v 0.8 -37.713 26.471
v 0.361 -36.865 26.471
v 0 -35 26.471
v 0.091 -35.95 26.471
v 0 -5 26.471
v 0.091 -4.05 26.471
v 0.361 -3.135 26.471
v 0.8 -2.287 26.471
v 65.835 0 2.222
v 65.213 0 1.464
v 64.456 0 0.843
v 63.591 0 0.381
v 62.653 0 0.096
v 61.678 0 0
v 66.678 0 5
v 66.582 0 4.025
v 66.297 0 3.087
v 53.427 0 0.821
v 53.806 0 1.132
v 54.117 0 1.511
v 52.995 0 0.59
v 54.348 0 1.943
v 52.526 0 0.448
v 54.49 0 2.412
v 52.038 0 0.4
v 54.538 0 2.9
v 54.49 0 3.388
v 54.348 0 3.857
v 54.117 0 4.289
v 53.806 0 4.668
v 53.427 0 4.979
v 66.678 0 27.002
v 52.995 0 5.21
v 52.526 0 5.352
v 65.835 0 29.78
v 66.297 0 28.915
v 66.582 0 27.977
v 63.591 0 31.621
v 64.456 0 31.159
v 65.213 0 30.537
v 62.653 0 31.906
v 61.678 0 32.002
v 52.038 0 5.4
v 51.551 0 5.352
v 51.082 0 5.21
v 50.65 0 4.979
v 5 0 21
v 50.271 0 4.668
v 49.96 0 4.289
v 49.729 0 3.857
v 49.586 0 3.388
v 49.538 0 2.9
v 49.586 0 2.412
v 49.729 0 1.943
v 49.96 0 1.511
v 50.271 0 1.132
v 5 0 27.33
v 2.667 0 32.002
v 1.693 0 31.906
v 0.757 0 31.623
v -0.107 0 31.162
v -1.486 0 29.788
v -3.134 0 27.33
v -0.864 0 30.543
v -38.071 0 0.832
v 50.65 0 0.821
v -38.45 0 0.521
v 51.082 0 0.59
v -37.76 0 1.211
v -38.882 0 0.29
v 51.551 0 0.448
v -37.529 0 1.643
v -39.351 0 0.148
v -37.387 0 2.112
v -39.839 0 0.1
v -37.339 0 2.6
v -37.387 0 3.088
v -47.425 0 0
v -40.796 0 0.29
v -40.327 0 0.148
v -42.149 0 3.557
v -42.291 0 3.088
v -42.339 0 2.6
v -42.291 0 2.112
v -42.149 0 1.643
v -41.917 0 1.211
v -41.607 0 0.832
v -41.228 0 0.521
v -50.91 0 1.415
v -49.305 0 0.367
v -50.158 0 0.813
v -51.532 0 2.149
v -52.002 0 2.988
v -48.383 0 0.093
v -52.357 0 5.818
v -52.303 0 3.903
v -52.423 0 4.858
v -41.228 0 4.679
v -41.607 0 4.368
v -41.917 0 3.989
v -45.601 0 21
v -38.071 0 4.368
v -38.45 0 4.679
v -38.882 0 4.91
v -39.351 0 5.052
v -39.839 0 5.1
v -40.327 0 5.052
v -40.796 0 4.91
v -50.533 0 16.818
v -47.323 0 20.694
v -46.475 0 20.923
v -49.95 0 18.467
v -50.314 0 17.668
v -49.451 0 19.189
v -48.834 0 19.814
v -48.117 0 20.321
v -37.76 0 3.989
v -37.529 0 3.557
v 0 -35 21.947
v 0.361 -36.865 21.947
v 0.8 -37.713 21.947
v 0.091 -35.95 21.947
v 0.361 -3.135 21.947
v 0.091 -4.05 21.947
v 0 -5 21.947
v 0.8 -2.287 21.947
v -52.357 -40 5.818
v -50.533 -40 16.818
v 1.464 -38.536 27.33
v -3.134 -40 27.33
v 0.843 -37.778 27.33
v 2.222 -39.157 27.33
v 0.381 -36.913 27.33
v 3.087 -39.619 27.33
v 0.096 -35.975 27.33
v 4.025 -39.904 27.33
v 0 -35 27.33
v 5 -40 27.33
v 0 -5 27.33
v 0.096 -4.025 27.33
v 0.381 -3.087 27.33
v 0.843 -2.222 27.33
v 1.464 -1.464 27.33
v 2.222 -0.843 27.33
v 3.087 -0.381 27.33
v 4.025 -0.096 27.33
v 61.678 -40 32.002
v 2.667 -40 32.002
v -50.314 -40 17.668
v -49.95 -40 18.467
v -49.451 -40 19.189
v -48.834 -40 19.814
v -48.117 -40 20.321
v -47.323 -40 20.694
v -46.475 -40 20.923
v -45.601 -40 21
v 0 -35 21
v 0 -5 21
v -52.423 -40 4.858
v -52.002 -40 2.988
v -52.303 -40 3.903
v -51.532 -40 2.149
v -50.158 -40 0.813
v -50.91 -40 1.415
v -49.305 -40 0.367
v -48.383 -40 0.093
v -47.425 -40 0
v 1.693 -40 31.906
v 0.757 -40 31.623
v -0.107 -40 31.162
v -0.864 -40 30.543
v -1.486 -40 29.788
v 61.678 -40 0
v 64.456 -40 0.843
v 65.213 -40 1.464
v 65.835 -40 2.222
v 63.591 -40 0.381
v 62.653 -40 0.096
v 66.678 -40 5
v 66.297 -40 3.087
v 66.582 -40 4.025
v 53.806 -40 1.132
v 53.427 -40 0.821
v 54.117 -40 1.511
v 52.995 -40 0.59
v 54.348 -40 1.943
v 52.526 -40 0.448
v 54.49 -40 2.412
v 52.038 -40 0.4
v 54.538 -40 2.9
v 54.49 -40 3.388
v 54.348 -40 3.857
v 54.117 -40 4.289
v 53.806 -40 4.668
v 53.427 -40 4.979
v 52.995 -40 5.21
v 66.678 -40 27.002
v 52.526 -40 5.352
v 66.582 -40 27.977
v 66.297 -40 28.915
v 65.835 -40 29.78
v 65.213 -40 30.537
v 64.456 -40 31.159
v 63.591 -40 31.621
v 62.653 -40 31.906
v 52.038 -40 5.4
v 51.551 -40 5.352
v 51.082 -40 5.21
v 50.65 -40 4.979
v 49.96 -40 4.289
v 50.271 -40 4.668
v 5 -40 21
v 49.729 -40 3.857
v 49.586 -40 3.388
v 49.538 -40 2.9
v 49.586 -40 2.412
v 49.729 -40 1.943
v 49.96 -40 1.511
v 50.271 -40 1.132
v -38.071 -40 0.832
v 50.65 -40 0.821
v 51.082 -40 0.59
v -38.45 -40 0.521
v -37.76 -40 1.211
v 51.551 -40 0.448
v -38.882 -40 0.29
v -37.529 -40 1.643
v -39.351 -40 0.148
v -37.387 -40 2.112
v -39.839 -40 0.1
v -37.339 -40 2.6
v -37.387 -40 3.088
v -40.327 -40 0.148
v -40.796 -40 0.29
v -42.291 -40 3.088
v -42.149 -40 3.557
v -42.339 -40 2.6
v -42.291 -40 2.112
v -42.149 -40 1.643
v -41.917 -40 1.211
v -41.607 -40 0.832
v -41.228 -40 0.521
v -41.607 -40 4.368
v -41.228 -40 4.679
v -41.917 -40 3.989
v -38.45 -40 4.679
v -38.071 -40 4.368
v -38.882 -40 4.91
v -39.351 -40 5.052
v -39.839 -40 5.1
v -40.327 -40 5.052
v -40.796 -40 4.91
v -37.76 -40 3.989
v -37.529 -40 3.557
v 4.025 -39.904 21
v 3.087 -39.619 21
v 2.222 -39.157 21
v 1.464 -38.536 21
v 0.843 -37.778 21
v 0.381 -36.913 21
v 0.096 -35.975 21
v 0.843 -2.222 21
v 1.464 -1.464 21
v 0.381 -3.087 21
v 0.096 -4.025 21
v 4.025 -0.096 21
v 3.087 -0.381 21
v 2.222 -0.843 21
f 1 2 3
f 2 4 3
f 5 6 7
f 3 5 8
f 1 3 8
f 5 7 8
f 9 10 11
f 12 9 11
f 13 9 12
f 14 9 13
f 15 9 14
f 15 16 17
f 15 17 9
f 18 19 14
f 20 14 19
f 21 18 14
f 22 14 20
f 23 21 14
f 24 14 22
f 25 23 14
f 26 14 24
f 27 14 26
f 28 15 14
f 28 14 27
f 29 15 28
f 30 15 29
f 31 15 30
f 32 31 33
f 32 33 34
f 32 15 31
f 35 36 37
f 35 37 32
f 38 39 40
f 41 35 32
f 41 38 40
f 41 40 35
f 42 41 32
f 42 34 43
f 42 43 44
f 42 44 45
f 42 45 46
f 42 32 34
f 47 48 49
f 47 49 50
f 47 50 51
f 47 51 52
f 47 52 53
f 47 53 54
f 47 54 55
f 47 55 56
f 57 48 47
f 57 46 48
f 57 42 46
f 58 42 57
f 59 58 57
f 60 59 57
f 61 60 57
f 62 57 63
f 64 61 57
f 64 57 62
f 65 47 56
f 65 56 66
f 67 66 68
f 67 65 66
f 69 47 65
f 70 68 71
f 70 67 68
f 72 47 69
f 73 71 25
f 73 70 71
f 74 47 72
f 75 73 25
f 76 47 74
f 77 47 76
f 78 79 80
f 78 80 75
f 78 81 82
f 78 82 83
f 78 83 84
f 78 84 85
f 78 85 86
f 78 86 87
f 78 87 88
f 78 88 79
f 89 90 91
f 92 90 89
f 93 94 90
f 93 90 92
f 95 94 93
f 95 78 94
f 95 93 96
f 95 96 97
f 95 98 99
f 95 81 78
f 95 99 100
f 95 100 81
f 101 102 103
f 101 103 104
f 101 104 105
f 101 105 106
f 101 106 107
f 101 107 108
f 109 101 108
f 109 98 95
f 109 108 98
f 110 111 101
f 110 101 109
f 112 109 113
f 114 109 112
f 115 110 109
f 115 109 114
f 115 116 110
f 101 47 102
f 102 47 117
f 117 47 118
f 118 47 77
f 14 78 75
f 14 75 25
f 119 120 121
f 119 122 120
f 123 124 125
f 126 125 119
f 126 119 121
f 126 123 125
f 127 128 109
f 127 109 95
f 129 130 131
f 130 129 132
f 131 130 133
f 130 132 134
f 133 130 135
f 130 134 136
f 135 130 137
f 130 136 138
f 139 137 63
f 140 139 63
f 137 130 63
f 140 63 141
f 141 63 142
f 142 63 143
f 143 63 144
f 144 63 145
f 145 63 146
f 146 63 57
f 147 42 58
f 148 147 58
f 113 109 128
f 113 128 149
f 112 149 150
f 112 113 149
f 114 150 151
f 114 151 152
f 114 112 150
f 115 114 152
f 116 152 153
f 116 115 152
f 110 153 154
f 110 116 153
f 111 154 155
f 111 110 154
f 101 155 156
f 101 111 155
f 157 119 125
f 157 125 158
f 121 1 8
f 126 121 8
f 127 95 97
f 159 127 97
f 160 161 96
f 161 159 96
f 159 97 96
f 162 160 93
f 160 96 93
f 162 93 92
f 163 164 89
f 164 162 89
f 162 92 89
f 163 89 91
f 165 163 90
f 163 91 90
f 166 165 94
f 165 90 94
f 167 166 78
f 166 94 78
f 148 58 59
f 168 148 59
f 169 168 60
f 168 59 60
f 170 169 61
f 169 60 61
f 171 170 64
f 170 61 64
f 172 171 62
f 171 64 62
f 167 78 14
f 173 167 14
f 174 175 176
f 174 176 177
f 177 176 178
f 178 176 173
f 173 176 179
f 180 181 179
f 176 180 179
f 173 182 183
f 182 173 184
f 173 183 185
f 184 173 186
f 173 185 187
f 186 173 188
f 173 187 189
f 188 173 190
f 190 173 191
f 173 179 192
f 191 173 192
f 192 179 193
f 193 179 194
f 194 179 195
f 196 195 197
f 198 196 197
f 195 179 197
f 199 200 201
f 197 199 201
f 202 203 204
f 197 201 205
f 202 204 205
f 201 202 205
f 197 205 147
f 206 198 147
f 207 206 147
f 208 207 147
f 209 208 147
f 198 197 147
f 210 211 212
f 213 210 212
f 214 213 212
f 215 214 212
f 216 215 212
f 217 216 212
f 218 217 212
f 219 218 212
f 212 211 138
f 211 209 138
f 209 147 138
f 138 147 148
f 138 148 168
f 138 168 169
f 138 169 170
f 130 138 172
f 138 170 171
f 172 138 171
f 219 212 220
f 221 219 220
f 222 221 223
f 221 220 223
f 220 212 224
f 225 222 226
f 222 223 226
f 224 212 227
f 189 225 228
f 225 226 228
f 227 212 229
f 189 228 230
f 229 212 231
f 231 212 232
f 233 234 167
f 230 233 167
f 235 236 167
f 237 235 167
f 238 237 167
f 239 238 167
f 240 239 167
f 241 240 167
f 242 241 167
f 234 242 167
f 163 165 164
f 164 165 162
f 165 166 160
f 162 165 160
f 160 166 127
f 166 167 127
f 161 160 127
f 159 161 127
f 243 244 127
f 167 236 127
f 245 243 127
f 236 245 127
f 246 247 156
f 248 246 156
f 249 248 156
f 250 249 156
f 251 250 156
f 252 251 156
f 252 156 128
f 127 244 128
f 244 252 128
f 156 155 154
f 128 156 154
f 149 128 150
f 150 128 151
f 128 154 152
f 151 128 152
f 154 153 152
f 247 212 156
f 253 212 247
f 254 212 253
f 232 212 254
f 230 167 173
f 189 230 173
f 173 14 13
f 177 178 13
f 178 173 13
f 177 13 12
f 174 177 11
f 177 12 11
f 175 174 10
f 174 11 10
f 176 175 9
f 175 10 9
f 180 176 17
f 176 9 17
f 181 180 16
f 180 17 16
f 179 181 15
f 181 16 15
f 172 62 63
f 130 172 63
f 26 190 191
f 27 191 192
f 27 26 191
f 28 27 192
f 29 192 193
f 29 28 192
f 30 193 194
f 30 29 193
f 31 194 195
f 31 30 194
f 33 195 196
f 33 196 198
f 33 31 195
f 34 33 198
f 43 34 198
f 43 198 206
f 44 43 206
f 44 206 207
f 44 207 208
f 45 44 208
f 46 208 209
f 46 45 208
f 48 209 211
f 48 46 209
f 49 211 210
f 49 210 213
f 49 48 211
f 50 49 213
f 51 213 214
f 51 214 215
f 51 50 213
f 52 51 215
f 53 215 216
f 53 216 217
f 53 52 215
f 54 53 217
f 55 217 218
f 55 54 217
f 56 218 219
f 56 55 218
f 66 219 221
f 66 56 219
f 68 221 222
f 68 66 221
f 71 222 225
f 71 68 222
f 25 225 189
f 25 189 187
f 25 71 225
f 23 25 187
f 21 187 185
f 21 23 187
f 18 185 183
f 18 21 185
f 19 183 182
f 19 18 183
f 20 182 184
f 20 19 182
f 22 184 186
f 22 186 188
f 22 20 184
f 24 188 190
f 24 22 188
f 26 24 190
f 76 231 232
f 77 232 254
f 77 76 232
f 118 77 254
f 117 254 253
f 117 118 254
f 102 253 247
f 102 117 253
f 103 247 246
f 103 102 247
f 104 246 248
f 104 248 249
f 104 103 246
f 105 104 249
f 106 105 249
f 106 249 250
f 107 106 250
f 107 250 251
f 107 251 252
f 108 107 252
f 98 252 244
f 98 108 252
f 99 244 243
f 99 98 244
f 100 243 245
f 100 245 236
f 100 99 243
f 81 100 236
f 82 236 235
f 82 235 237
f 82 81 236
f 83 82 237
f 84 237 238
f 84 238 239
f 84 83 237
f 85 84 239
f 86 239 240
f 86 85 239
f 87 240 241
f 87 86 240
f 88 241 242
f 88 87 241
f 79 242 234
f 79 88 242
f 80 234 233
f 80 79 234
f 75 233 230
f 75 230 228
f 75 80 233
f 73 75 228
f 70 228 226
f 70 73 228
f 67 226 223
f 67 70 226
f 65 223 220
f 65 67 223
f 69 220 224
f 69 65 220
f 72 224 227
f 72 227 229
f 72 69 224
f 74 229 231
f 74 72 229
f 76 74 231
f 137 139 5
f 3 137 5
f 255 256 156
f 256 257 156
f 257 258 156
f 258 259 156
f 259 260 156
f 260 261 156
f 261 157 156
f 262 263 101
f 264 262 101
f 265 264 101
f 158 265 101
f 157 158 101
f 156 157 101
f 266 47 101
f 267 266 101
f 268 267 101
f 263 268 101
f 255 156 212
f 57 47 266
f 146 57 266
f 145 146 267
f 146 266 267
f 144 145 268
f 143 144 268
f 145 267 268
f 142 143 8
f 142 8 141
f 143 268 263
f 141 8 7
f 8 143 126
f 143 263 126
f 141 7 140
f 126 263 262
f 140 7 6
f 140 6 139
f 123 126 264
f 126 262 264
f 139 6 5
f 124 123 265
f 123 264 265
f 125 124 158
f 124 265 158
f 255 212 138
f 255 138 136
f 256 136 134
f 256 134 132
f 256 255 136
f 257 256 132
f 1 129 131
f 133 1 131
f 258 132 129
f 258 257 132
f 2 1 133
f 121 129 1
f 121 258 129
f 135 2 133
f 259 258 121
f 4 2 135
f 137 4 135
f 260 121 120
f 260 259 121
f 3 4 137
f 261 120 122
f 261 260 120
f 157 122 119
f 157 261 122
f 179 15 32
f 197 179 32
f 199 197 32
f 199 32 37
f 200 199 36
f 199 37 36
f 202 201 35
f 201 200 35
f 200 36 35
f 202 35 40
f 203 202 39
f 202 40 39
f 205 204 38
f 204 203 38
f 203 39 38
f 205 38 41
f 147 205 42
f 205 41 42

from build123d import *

# Parameters (mm, degrees)
F0_R        = 2.5
F0_W        = 4.0654889308
F0_H        = 4.077391699
F1_DEPTH    = 40
F2_DEPTH    = 0.1
F3_W        = 37.3762528179
F3_H        = 4.5243166387
F4_DEPTH    = 0.8
F5_T1_DEPTH = 61.1957339443
F5_T3_DEPTH = 69.4870657294
F5_T5_DEPTH = 6.3301489651
F5_T7_DEPTH = 53.3325486423
F5_T9_DEPTH = 65


# Not quite as in the source:
# - a fillet or chamfer that OpenCascade refuses, or shapes differently, is made with other operations: its cross-section is extruded or revolved along the edge and cut away or added


with BuildPart() as f1:
    # F0 (on Front) → F1 (new body)
    with BuildSketch(Plane.XZ):
        Polygon((-49.8398691416, 21), (-53.3222284913, 0), (0, 0), (26.6024060547, 0), (66.6777715087, 0), (66.6777715087, 32.0019141734), (0, 32.0019141734), (0, 27.3301489651), (0, 26.5009570867), (4.0654889308, 26.5009570867), (4.0654889308, 22.4235653877), (0, 22.4235653877), (0, 21), align=None)
        with Locations((-39.8388169706, 2.6)):
            Circle(F0_R, mode=Mode.SUBTRACT)
        with Locations((52.0384535193, 2.9)):
            Circle(F0_R, mode=Mode.SUBTRACT)
        with Locations((2.0327444654, 24.4622612372)):
            Rectangle(F0_W, F0_H)
        Polygon((0, 27.3301489651), (0, 32.0019141734), (-3.1343069183, 27.3301489651), align=None)
    extrude(amount=F1_DEPTH)

    # F2 (add): a face of the model
    f2_faces = [f1.faces().sort_by_distance(p)[0] for p in [
        (-24.9199345708, -20, 21),
    ]]
    extrude(f2_faces, amount=-F2_DEPTH)

    # F3 (on Right) → F4 (cut)
    with BuildSketch(Plane.YZ):
        with Locations((-20.0095633627, 24.2089927197)):
            Rectangle(F3_W, F3_H)
    extrude(amount=F4_DEPTH, mode=Mode.SUBTRACT)

    # F5: fillet of radius 5 on 7 edges, made by hand

    # F5_s2 → F5_t1 (cut)
    with BuildSketch(Plane.XZ.offset(-10.5978669722)):
        with BuildLine():
            ThreePointArc((-50.5333622544, 16.81796308), (-48.8341558683, 19.8137786643), (-45.6007223527, 21))
            Line((-45.6007223527, 21), (-49.8398691416, 21))
            Line((-49.8398691416, 21), (-50.5333622544, 16.81796308))
        make_face()
    extrude(amount=F5_T1_DEPTH, mode=Mode.SUBTRACT)

    # F5_s4 → F5_t3 (cut)
    with BuildSketch(Plane.XZ.offset(-14.7435328647)):
        with BuildLine():
            ThreePointArc((-52.3574552471, 5.81796308), (-51.2385940097, 1.7665664844), (-47.4248153454, 0))
            Line((-47.4248153454, 0), (-53.3222284913, 0))
            Line((-53.3222284913, 0), (-52.3574552471, 5.81796308))
        make_face()
    extrude(amount=F5_T3_DEPTH, mode=Mode.SUBTRACT)

    # F5_s6 → F5_t5 (cut)
    with BuildSketch(Plane.XY.offset(21)):
        with BuildLine():
            ThreePointArc((5, 0), (1.4644660941, -1.4644660941), (0, -5))
            Line((0, -5), (0, 0))
            Line((0, 0), (5, 0))
        make_face()
        with BuildLine():
            ThreePointArc((5, -40), (1.4644660941, -38.5355339059), (0, -35))
            Line((0, -35), (0, -40))
            Line((0, -40), (5, -40))
        make_face()
    extrude(amount=F5_T5_DEPTH, mode=Mode.SUBTRACT)

    # F5_s8 → F5_t7 (cut)
    with BuildSketch(Plane.XZ.offset(-6.6662743212)):
        with BuildLine():
            ThreePointArc((2.6665097285, 32.0019141734), (0.3136763633, 31.4137363769), (-1.4856032643, 29.7875842356))
            Line((-1.4856032643, 29.7875842356), (0, 32.0019141734))
            Line((0, 32.0019141734), (2.6665097285, 32.0019141734))
        make_face()
    extrude(amount=F5_T7_DEPTH, mode=Mode.SUBTRACT)

    # F5_s10 → F5_t9 (cut)
    with BuildSketch(Plane.XZ.offset(-12.5)):
        with BuildLine():
            ThreePointArc((61.6777715087, 0), (65.2133054146, 1.4644660941), (66.6777715087, 5))
            Line((66.6777715087, 5), (66.6777715087, 0))
            Line((66.6777715087, 0), (61.6777715087, 0))
        make_face()
        with BuildLine():
            ThreePointArc((66.6777715087, 27.0019141734), (65.2133054146, 30.5374480793), (61.6777715087, 32.0019141734))
            Line((61.6777715087, 32.0019141734), (66.6777715087, 32.0019141734))
            Line((66.6777715087, 32.0019141734), (66.6777715087, 27.0019141734))
        make_face()
    extrude(amount=F5_T9_DEPTH, mode=Mode.SUBTRACT)


solid = f1.part
